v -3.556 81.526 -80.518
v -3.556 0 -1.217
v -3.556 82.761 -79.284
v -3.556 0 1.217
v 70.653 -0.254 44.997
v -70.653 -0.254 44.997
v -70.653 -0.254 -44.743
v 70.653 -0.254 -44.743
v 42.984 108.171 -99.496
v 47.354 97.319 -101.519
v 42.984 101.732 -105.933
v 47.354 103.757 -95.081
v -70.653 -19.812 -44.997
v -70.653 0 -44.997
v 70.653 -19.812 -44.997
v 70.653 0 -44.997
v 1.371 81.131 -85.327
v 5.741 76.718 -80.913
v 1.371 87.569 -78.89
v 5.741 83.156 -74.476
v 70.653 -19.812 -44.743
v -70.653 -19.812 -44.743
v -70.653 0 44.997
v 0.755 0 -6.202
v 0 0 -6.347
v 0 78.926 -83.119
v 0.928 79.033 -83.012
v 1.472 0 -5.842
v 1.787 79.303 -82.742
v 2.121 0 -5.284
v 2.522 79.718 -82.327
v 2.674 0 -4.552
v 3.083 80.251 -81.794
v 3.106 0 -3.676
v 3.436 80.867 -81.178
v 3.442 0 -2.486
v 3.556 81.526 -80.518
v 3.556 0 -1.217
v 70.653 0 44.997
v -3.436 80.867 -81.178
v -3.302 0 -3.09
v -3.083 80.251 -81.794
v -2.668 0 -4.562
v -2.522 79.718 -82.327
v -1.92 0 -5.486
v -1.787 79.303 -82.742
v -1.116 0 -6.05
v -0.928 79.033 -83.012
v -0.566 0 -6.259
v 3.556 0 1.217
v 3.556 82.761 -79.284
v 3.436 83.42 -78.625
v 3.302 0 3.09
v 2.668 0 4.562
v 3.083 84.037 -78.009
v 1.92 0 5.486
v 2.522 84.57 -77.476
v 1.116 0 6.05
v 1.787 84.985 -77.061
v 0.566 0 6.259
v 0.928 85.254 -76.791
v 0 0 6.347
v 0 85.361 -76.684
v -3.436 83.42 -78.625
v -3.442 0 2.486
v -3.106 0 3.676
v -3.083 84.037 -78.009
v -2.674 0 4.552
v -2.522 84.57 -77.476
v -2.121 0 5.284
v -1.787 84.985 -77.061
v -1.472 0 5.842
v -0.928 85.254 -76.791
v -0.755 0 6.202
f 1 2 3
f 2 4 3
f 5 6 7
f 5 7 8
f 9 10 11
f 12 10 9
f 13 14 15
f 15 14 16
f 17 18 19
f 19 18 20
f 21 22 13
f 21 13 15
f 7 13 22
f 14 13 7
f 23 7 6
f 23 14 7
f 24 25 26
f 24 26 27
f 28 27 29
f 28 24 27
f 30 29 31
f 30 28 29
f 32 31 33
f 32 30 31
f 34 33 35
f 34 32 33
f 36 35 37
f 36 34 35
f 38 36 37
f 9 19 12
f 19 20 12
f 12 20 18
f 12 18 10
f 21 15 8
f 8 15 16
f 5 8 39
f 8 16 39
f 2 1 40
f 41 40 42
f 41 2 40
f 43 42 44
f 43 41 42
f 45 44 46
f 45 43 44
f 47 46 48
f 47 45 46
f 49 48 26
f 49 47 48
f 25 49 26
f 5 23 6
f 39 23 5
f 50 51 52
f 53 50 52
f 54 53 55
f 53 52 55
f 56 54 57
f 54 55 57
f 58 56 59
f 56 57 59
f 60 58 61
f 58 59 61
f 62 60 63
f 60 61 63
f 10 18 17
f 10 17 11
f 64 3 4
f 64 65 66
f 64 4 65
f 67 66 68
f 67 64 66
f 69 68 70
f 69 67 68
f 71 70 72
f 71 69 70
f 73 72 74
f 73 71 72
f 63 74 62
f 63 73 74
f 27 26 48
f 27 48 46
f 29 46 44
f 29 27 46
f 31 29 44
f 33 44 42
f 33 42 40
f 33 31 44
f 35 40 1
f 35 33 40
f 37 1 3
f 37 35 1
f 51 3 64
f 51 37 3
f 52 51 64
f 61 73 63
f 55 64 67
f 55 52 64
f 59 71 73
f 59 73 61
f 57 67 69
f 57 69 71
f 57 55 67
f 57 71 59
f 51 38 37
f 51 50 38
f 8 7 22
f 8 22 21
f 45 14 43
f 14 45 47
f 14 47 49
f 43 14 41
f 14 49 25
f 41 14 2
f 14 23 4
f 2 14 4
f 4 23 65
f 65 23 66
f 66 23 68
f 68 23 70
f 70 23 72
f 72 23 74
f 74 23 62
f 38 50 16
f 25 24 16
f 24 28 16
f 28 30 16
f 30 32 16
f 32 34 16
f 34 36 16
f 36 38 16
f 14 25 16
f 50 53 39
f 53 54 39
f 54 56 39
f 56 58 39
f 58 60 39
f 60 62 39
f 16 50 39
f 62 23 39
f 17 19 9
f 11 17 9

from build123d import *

# Parameters (mm, degrees)
F0_W         = 141.3057297468
F0_H         = 89.9935886264
F1_DEPTH     = 0.254
F2_W         = 141.3057297468
F2_H         = 0.254
F3_DEPTH     = 19.558
F5_DEPTH     = 3.556
F7_W         = 50.8
F7_H         = 9.1045236337
F8_DEPTH     = 3.81
F9_T4_DEPTH  = 137.4814553735
F9_T9_DEPTH  = 128.499341567
F9_T14_DEPTH = 137.4814553735
F9_T19_DEPTH = 128.499341567


# Not quite as in the source:
# - a fillet or chamfer that OpenCascade refuses, or shapes differently, is made with other operations: its cross-section is extruded or revolved along the edge and cut away or added


with BuildPart() as f1:
    # F0 (on Front) → F1 (new body)
    with BuildSketch(Plane.XZ):
        Rectangle(F0_W, F0_H)
    extrude(amount=F1_DEPTH)

    # F2 (on face) → F3 (join)
    with BuildSketch(Plane.XZ.offset(0.254)):
        with Locations((0, -44.8697943132)):
            Rectangle(F2_W, F2_H)
    extrude(amount=F3_DEPTH)

    # F4 (on Right) → F5 (join, symmetric)
    with BuildSketch(Plane.YZ):
        Polygon((85.3628445563, -76.6828684929), (0, 6.35), (0, -6.35), (78.9242684841, -83.120033145), align=None)
    extrude(amount=F5_DEPTH, both=True)

    # F9: fillet of radius 3.6792614691 on 4 edges, made by hand


with BuildPart() as f8:
    # F7 (on face) → F8 (new body, symmetric)
    with BuildSketch(Plane(origin=(-52.6664876685, 53.1795875222, -53.1912477395), x_dir=(0.8191520443, 0.4055353262, -0.4056242443), z_dir=(0.5735764364, -0.5791644677, 0.579291456))):
        with Locations((94.0349842627, 1.5979685725)):
            Rectangle(F7_W, F7_H)
    extrude(amount=F8_DEPTH, both=True)


with BuildPart() as f9_tool2:
    # F9_s3 → F9_t4 (new body)
    with BuildSketch(Plane(origin=(0, 88.7824981746, -86.3591827769), x_dir=(1, 0, 0), z_dir=(0, -0.7168219209, 0.6972562899))):
        with BuildLine():
            ThreePointArc((-3.556, 0.8725577284), (-2.4783692655, 3.474188463), (0.1232614691, 4.5518191975))
            Line((0.1232614691, 4.5518191975), (-3.556, 4.5518191975))
            Line((-3.556, 4.5518191975), (-3.556, 0.8725577284))
        make_face()
    extrude(amount=F9_T4_DEPTH)

    split(bisect_by=Plane.XZ, keep=Keep.BOTTOM)


with BuildPart() as f1_1:
    add(f1.part)

    # F9_t1: cut F9_tool2
    add(f9_tool2.part, mode=Mode.SUBTRACT)


with BuildPart() as f9_tool7:
    # F9_s8 → F9_t9 (new body)
    with BuildSketch(Plane(origin=(0, -3.4196536182, 3.326314284), x_dir=(1, 0, 0), z_dir=(0, 0.7168219209, -0.6972562899))):
        with BuildLine():
            ThreePointArc((-3.556, 0.8725577284), (-2.4783692655, 3.474188463), (0.1232614691, 4.5518191975))
            Line((0.1232614691, 4.5518191975), (-3.556, 4.5518191975))
            Line((-3.556, 4.5518191975), (-3.556, 0.8725577284))
        make_face()
    extrude(amount=F9_T9_DEPTH)

    split(bisect_by=Plane.XZ, keep=Keep.BOTTOM)


with BuildPart() as f1_2:
    add(f1_1.part)

    # F9_t6: cut F9_tool7
    add(f9_tool7.part, mode=Mode.SUBTRACT)


with BuildPart() as f9_tool12:
    # F9_s13 → F9_t14 (new body)
    with BuildSketch(Plane(origin=(0, 88.7824981746, -86.3591827769), x_dir=(1, 0, 0), z_dir=(0, -0.7168219209, 0.6972562899))):
        with BuildLine():
            ThreePointArc((3.556, 0.8725577284), (2.4783692655, 3.474188463), (-0.1232614691, 4.5518191975))
            Line((-0.1232614691, 4.5518191975), (3.556, 4.5518191975))
            Line((3.556, 4.5518191975), (3.556, 0.8725577284))
        make_face()
    extrude(amount=F9_T14_DEPTH)

    split(bisect_by=Plane.XZ, keep=Keep.BOTTOM)


with BuildPart() as f1_3:
    add(f1_2.part)

    # F9_t11: cut F9_tool12
    add(f9_tool12.part, mode=Mode.SUBTRACT)


with BuildPart() as f9_tool17:
    # F9_s18 → F9_t19 (new body)
    with BuildSketch(Plane(origin=(0, -3.4196536182, 3.326314284), x_dir=(1, 0, 0), z_dir=(0, 0.7168219209, -0.6972562899))):
        with BuildLine():
            ThreePointArc((-0.1232614691, 4.5518191975), (2.4783692655, 3.474188463), (3.556, 0.8725577284))
            Line((3.556, 0.8725577284), (3.556, 4.5518191975))
            Line((3.556, 4.5518191975), (-0.1232614691, 4.5518191975))
        make_face()
    extrude(amount=F9_T19_DEPTH)

    split(bisect_by=Plane.XZ, keep=Keep.BOTTOM)


with BuildPart() as f1_4:
    add(f1_3.part)

    # F9_t16: cut F9_tool17
    add(f9_tool17.part, mode=Mode.SUBTRACT)


solid = Compound([f8.part, f1_4.part])
